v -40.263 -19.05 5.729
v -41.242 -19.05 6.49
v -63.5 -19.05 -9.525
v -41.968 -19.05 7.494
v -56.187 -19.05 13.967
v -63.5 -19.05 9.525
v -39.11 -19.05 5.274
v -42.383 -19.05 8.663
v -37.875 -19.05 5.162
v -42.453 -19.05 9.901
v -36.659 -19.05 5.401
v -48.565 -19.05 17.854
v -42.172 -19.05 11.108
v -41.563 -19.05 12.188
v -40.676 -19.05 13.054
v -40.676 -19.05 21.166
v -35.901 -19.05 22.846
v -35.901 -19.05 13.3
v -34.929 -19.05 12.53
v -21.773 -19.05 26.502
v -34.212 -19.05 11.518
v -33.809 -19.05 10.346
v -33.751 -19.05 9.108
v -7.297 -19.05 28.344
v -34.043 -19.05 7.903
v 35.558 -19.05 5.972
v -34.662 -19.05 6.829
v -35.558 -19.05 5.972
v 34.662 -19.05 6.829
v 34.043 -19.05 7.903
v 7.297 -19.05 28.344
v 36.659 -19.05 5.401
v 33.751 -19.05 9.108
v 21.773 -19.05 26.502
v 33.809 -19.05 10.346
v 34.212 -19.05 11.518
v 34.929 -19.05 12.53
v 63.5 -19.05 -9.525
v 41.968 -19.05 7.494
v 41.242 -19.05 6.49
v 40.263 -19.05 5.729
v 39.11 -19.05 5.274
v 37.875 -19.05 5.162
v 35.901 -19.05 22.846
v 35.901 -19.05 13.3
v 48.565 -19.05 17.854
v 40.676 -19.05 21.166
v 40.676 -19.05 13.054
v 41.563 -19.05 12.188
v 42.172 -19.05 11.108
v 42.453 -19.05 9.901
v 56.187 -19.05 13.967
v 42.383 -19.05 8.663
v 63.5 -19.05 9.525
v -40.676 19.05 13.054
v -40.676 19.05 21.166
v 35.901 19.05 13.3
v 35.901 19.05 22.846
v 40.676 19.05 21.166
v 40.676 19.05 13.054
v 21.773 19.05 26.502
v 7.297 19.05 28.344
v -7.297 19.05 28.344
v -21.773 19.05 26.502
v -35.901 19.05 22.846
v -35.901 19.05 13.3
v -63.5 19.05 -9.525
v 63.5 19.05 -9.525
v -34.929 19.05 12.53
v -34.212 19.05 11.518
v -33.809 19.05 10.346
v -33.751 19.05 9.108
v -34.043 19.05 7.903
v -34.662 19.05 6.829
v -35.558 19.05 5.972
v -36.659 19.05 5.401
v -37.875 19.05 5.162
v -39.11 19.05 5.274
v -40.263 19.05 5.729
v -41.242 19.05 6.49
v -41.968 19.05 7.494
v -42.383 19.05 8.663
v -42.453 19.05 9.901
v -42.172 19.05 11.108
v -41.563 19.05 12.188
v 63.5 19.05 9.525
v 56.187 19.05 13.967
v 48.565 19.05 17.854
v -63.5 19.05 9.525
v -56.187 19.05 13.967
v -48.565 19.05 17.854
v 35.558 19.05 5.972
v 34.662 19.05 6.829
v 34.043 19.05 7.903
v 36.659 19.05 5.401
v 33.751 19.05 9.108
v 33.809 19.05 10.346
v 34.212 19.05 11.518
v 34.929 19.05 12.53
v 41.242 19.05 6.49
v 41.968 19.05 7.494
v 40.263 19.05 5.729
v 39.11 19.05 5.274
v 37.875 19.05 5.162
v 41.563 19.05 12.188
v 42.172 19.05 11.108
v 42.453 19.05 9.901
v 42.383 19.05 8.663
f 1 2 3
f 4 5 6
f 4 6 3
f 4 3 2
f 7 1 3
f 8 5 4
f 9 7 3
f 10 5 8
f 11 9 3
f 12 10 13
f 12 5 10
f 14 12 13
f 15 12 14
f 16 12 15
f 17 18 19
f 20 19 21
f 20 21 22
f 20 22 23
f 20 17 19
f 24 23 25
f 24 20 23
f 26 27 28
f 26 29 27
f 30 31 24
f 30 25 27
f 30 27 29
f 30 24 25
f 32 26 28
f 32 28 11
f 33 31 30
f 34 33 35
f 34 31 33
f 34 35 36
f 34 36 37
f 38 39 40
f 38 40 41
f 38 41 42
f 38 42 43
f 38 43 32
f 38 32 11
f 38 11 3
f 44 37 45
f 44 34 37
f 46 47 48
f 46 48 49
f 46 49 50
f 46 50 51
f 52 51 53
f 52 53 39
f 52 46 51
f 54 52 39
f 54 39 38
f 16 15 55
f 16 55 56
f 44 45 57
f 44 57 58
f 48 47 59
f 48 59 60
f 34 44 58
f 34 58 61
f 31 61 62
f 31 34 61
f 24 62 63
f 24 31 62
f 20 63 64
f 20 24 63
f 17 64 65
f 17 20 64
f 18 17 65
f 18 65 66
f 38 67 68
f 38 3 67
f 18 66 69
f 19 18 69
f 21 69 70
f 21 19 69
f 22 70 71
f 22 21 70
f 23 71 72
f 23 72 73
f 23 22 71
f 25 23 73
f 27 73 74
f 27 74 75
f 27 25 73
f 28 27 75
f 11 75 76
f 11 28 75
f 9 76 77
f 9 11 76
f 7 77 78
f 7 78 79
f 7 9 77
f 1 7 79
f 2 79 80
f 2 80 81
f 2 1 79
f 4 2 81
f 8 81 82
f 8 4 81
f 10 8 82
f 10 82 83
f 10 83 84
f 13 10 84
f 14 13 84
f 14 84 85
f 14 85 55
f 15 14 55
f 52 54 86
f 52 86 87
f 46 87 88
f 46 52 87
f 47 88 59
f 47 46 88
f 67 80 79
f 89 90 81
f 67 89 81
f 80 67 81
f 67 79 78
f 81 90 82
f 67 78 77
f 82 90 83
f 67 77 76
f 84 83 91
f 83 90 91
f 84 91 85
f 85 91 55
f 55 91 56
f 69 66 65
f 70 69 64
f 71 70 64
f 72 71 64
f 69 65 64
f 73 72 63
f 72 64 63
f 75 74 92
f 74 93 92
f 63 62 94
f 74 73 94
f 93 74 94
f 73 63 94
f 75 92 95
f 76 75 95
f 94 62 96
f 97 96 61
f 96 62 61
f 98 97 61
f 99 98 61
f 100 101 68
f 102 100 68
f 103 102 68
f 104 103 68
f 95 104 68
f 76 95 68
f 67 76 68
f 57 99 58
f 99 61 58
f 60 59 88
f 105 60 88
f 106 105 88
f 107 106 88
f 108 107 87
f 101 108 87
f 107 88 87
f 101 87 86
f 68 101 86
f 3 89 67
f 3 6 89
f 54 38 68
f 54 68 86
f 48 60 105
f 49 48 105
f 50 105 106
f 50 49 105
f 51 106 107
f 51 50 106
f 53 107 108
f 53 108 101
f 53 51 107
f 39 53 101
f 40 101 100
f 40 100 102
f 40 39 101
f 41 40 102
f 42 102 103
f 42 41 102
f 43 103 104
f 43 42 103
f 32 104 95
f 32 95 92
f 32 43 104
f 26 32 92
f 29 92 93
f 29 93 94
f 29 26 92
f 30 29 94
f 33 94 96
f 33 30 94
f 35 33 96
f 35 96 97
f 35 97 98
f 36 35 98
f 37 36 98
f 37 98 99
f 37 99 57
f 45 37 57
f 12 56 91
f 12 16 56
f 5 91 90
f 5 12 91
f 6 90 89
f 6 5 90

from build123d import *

# Parameters (mm, degrees)
F1_DEPTH = 19.05


with BuildPart() as f1:
    # F0 (on Front) → F1 (new body, symmetric)
    with BuildSketch(Plane.XZ):
        with BuildLine():
            Line((-63.5, -9.525), (63.5, -9.525))
            Line((63.5, -9.525), (63.5, 9.525))
            ThreePointArc((63.5, 9.525), (52.412089, 15.981047), (40.67581, 21.165838))
            Line((40.67581, 21.165838), (40.67581, 13.053685))
            ThreePointArc((40.67581, 13.053685), (37.875132, 5.161991), (35.90061, 13.299797))
            Line((35.90061, 13.299797), (35.90061, 22.846459))
            ThreePointArc((35.90061, 22.846459), (0, 28.575), (-35.90061, 22.846459))
            Line((-35.90061, 22.846459), (-35.90061, 13.299797))
            ThreePointArc((-35.90061, 13.299797), (-37.875132, 5.161991), (-40.67581, 13.053685))
            Line((-40.67581, 13.053685), (-40.67581, 21.165838))
            ThreePointArc((-40.67581, 21.165838), (-52.412089, 15.981047), (-63.5, 9.525))
            Line((-63.5, 9.525), (-63.5, -9.525))
        make_face()
    extrude(amount=F1_DEPTH, both=True)


solid = f1.part
